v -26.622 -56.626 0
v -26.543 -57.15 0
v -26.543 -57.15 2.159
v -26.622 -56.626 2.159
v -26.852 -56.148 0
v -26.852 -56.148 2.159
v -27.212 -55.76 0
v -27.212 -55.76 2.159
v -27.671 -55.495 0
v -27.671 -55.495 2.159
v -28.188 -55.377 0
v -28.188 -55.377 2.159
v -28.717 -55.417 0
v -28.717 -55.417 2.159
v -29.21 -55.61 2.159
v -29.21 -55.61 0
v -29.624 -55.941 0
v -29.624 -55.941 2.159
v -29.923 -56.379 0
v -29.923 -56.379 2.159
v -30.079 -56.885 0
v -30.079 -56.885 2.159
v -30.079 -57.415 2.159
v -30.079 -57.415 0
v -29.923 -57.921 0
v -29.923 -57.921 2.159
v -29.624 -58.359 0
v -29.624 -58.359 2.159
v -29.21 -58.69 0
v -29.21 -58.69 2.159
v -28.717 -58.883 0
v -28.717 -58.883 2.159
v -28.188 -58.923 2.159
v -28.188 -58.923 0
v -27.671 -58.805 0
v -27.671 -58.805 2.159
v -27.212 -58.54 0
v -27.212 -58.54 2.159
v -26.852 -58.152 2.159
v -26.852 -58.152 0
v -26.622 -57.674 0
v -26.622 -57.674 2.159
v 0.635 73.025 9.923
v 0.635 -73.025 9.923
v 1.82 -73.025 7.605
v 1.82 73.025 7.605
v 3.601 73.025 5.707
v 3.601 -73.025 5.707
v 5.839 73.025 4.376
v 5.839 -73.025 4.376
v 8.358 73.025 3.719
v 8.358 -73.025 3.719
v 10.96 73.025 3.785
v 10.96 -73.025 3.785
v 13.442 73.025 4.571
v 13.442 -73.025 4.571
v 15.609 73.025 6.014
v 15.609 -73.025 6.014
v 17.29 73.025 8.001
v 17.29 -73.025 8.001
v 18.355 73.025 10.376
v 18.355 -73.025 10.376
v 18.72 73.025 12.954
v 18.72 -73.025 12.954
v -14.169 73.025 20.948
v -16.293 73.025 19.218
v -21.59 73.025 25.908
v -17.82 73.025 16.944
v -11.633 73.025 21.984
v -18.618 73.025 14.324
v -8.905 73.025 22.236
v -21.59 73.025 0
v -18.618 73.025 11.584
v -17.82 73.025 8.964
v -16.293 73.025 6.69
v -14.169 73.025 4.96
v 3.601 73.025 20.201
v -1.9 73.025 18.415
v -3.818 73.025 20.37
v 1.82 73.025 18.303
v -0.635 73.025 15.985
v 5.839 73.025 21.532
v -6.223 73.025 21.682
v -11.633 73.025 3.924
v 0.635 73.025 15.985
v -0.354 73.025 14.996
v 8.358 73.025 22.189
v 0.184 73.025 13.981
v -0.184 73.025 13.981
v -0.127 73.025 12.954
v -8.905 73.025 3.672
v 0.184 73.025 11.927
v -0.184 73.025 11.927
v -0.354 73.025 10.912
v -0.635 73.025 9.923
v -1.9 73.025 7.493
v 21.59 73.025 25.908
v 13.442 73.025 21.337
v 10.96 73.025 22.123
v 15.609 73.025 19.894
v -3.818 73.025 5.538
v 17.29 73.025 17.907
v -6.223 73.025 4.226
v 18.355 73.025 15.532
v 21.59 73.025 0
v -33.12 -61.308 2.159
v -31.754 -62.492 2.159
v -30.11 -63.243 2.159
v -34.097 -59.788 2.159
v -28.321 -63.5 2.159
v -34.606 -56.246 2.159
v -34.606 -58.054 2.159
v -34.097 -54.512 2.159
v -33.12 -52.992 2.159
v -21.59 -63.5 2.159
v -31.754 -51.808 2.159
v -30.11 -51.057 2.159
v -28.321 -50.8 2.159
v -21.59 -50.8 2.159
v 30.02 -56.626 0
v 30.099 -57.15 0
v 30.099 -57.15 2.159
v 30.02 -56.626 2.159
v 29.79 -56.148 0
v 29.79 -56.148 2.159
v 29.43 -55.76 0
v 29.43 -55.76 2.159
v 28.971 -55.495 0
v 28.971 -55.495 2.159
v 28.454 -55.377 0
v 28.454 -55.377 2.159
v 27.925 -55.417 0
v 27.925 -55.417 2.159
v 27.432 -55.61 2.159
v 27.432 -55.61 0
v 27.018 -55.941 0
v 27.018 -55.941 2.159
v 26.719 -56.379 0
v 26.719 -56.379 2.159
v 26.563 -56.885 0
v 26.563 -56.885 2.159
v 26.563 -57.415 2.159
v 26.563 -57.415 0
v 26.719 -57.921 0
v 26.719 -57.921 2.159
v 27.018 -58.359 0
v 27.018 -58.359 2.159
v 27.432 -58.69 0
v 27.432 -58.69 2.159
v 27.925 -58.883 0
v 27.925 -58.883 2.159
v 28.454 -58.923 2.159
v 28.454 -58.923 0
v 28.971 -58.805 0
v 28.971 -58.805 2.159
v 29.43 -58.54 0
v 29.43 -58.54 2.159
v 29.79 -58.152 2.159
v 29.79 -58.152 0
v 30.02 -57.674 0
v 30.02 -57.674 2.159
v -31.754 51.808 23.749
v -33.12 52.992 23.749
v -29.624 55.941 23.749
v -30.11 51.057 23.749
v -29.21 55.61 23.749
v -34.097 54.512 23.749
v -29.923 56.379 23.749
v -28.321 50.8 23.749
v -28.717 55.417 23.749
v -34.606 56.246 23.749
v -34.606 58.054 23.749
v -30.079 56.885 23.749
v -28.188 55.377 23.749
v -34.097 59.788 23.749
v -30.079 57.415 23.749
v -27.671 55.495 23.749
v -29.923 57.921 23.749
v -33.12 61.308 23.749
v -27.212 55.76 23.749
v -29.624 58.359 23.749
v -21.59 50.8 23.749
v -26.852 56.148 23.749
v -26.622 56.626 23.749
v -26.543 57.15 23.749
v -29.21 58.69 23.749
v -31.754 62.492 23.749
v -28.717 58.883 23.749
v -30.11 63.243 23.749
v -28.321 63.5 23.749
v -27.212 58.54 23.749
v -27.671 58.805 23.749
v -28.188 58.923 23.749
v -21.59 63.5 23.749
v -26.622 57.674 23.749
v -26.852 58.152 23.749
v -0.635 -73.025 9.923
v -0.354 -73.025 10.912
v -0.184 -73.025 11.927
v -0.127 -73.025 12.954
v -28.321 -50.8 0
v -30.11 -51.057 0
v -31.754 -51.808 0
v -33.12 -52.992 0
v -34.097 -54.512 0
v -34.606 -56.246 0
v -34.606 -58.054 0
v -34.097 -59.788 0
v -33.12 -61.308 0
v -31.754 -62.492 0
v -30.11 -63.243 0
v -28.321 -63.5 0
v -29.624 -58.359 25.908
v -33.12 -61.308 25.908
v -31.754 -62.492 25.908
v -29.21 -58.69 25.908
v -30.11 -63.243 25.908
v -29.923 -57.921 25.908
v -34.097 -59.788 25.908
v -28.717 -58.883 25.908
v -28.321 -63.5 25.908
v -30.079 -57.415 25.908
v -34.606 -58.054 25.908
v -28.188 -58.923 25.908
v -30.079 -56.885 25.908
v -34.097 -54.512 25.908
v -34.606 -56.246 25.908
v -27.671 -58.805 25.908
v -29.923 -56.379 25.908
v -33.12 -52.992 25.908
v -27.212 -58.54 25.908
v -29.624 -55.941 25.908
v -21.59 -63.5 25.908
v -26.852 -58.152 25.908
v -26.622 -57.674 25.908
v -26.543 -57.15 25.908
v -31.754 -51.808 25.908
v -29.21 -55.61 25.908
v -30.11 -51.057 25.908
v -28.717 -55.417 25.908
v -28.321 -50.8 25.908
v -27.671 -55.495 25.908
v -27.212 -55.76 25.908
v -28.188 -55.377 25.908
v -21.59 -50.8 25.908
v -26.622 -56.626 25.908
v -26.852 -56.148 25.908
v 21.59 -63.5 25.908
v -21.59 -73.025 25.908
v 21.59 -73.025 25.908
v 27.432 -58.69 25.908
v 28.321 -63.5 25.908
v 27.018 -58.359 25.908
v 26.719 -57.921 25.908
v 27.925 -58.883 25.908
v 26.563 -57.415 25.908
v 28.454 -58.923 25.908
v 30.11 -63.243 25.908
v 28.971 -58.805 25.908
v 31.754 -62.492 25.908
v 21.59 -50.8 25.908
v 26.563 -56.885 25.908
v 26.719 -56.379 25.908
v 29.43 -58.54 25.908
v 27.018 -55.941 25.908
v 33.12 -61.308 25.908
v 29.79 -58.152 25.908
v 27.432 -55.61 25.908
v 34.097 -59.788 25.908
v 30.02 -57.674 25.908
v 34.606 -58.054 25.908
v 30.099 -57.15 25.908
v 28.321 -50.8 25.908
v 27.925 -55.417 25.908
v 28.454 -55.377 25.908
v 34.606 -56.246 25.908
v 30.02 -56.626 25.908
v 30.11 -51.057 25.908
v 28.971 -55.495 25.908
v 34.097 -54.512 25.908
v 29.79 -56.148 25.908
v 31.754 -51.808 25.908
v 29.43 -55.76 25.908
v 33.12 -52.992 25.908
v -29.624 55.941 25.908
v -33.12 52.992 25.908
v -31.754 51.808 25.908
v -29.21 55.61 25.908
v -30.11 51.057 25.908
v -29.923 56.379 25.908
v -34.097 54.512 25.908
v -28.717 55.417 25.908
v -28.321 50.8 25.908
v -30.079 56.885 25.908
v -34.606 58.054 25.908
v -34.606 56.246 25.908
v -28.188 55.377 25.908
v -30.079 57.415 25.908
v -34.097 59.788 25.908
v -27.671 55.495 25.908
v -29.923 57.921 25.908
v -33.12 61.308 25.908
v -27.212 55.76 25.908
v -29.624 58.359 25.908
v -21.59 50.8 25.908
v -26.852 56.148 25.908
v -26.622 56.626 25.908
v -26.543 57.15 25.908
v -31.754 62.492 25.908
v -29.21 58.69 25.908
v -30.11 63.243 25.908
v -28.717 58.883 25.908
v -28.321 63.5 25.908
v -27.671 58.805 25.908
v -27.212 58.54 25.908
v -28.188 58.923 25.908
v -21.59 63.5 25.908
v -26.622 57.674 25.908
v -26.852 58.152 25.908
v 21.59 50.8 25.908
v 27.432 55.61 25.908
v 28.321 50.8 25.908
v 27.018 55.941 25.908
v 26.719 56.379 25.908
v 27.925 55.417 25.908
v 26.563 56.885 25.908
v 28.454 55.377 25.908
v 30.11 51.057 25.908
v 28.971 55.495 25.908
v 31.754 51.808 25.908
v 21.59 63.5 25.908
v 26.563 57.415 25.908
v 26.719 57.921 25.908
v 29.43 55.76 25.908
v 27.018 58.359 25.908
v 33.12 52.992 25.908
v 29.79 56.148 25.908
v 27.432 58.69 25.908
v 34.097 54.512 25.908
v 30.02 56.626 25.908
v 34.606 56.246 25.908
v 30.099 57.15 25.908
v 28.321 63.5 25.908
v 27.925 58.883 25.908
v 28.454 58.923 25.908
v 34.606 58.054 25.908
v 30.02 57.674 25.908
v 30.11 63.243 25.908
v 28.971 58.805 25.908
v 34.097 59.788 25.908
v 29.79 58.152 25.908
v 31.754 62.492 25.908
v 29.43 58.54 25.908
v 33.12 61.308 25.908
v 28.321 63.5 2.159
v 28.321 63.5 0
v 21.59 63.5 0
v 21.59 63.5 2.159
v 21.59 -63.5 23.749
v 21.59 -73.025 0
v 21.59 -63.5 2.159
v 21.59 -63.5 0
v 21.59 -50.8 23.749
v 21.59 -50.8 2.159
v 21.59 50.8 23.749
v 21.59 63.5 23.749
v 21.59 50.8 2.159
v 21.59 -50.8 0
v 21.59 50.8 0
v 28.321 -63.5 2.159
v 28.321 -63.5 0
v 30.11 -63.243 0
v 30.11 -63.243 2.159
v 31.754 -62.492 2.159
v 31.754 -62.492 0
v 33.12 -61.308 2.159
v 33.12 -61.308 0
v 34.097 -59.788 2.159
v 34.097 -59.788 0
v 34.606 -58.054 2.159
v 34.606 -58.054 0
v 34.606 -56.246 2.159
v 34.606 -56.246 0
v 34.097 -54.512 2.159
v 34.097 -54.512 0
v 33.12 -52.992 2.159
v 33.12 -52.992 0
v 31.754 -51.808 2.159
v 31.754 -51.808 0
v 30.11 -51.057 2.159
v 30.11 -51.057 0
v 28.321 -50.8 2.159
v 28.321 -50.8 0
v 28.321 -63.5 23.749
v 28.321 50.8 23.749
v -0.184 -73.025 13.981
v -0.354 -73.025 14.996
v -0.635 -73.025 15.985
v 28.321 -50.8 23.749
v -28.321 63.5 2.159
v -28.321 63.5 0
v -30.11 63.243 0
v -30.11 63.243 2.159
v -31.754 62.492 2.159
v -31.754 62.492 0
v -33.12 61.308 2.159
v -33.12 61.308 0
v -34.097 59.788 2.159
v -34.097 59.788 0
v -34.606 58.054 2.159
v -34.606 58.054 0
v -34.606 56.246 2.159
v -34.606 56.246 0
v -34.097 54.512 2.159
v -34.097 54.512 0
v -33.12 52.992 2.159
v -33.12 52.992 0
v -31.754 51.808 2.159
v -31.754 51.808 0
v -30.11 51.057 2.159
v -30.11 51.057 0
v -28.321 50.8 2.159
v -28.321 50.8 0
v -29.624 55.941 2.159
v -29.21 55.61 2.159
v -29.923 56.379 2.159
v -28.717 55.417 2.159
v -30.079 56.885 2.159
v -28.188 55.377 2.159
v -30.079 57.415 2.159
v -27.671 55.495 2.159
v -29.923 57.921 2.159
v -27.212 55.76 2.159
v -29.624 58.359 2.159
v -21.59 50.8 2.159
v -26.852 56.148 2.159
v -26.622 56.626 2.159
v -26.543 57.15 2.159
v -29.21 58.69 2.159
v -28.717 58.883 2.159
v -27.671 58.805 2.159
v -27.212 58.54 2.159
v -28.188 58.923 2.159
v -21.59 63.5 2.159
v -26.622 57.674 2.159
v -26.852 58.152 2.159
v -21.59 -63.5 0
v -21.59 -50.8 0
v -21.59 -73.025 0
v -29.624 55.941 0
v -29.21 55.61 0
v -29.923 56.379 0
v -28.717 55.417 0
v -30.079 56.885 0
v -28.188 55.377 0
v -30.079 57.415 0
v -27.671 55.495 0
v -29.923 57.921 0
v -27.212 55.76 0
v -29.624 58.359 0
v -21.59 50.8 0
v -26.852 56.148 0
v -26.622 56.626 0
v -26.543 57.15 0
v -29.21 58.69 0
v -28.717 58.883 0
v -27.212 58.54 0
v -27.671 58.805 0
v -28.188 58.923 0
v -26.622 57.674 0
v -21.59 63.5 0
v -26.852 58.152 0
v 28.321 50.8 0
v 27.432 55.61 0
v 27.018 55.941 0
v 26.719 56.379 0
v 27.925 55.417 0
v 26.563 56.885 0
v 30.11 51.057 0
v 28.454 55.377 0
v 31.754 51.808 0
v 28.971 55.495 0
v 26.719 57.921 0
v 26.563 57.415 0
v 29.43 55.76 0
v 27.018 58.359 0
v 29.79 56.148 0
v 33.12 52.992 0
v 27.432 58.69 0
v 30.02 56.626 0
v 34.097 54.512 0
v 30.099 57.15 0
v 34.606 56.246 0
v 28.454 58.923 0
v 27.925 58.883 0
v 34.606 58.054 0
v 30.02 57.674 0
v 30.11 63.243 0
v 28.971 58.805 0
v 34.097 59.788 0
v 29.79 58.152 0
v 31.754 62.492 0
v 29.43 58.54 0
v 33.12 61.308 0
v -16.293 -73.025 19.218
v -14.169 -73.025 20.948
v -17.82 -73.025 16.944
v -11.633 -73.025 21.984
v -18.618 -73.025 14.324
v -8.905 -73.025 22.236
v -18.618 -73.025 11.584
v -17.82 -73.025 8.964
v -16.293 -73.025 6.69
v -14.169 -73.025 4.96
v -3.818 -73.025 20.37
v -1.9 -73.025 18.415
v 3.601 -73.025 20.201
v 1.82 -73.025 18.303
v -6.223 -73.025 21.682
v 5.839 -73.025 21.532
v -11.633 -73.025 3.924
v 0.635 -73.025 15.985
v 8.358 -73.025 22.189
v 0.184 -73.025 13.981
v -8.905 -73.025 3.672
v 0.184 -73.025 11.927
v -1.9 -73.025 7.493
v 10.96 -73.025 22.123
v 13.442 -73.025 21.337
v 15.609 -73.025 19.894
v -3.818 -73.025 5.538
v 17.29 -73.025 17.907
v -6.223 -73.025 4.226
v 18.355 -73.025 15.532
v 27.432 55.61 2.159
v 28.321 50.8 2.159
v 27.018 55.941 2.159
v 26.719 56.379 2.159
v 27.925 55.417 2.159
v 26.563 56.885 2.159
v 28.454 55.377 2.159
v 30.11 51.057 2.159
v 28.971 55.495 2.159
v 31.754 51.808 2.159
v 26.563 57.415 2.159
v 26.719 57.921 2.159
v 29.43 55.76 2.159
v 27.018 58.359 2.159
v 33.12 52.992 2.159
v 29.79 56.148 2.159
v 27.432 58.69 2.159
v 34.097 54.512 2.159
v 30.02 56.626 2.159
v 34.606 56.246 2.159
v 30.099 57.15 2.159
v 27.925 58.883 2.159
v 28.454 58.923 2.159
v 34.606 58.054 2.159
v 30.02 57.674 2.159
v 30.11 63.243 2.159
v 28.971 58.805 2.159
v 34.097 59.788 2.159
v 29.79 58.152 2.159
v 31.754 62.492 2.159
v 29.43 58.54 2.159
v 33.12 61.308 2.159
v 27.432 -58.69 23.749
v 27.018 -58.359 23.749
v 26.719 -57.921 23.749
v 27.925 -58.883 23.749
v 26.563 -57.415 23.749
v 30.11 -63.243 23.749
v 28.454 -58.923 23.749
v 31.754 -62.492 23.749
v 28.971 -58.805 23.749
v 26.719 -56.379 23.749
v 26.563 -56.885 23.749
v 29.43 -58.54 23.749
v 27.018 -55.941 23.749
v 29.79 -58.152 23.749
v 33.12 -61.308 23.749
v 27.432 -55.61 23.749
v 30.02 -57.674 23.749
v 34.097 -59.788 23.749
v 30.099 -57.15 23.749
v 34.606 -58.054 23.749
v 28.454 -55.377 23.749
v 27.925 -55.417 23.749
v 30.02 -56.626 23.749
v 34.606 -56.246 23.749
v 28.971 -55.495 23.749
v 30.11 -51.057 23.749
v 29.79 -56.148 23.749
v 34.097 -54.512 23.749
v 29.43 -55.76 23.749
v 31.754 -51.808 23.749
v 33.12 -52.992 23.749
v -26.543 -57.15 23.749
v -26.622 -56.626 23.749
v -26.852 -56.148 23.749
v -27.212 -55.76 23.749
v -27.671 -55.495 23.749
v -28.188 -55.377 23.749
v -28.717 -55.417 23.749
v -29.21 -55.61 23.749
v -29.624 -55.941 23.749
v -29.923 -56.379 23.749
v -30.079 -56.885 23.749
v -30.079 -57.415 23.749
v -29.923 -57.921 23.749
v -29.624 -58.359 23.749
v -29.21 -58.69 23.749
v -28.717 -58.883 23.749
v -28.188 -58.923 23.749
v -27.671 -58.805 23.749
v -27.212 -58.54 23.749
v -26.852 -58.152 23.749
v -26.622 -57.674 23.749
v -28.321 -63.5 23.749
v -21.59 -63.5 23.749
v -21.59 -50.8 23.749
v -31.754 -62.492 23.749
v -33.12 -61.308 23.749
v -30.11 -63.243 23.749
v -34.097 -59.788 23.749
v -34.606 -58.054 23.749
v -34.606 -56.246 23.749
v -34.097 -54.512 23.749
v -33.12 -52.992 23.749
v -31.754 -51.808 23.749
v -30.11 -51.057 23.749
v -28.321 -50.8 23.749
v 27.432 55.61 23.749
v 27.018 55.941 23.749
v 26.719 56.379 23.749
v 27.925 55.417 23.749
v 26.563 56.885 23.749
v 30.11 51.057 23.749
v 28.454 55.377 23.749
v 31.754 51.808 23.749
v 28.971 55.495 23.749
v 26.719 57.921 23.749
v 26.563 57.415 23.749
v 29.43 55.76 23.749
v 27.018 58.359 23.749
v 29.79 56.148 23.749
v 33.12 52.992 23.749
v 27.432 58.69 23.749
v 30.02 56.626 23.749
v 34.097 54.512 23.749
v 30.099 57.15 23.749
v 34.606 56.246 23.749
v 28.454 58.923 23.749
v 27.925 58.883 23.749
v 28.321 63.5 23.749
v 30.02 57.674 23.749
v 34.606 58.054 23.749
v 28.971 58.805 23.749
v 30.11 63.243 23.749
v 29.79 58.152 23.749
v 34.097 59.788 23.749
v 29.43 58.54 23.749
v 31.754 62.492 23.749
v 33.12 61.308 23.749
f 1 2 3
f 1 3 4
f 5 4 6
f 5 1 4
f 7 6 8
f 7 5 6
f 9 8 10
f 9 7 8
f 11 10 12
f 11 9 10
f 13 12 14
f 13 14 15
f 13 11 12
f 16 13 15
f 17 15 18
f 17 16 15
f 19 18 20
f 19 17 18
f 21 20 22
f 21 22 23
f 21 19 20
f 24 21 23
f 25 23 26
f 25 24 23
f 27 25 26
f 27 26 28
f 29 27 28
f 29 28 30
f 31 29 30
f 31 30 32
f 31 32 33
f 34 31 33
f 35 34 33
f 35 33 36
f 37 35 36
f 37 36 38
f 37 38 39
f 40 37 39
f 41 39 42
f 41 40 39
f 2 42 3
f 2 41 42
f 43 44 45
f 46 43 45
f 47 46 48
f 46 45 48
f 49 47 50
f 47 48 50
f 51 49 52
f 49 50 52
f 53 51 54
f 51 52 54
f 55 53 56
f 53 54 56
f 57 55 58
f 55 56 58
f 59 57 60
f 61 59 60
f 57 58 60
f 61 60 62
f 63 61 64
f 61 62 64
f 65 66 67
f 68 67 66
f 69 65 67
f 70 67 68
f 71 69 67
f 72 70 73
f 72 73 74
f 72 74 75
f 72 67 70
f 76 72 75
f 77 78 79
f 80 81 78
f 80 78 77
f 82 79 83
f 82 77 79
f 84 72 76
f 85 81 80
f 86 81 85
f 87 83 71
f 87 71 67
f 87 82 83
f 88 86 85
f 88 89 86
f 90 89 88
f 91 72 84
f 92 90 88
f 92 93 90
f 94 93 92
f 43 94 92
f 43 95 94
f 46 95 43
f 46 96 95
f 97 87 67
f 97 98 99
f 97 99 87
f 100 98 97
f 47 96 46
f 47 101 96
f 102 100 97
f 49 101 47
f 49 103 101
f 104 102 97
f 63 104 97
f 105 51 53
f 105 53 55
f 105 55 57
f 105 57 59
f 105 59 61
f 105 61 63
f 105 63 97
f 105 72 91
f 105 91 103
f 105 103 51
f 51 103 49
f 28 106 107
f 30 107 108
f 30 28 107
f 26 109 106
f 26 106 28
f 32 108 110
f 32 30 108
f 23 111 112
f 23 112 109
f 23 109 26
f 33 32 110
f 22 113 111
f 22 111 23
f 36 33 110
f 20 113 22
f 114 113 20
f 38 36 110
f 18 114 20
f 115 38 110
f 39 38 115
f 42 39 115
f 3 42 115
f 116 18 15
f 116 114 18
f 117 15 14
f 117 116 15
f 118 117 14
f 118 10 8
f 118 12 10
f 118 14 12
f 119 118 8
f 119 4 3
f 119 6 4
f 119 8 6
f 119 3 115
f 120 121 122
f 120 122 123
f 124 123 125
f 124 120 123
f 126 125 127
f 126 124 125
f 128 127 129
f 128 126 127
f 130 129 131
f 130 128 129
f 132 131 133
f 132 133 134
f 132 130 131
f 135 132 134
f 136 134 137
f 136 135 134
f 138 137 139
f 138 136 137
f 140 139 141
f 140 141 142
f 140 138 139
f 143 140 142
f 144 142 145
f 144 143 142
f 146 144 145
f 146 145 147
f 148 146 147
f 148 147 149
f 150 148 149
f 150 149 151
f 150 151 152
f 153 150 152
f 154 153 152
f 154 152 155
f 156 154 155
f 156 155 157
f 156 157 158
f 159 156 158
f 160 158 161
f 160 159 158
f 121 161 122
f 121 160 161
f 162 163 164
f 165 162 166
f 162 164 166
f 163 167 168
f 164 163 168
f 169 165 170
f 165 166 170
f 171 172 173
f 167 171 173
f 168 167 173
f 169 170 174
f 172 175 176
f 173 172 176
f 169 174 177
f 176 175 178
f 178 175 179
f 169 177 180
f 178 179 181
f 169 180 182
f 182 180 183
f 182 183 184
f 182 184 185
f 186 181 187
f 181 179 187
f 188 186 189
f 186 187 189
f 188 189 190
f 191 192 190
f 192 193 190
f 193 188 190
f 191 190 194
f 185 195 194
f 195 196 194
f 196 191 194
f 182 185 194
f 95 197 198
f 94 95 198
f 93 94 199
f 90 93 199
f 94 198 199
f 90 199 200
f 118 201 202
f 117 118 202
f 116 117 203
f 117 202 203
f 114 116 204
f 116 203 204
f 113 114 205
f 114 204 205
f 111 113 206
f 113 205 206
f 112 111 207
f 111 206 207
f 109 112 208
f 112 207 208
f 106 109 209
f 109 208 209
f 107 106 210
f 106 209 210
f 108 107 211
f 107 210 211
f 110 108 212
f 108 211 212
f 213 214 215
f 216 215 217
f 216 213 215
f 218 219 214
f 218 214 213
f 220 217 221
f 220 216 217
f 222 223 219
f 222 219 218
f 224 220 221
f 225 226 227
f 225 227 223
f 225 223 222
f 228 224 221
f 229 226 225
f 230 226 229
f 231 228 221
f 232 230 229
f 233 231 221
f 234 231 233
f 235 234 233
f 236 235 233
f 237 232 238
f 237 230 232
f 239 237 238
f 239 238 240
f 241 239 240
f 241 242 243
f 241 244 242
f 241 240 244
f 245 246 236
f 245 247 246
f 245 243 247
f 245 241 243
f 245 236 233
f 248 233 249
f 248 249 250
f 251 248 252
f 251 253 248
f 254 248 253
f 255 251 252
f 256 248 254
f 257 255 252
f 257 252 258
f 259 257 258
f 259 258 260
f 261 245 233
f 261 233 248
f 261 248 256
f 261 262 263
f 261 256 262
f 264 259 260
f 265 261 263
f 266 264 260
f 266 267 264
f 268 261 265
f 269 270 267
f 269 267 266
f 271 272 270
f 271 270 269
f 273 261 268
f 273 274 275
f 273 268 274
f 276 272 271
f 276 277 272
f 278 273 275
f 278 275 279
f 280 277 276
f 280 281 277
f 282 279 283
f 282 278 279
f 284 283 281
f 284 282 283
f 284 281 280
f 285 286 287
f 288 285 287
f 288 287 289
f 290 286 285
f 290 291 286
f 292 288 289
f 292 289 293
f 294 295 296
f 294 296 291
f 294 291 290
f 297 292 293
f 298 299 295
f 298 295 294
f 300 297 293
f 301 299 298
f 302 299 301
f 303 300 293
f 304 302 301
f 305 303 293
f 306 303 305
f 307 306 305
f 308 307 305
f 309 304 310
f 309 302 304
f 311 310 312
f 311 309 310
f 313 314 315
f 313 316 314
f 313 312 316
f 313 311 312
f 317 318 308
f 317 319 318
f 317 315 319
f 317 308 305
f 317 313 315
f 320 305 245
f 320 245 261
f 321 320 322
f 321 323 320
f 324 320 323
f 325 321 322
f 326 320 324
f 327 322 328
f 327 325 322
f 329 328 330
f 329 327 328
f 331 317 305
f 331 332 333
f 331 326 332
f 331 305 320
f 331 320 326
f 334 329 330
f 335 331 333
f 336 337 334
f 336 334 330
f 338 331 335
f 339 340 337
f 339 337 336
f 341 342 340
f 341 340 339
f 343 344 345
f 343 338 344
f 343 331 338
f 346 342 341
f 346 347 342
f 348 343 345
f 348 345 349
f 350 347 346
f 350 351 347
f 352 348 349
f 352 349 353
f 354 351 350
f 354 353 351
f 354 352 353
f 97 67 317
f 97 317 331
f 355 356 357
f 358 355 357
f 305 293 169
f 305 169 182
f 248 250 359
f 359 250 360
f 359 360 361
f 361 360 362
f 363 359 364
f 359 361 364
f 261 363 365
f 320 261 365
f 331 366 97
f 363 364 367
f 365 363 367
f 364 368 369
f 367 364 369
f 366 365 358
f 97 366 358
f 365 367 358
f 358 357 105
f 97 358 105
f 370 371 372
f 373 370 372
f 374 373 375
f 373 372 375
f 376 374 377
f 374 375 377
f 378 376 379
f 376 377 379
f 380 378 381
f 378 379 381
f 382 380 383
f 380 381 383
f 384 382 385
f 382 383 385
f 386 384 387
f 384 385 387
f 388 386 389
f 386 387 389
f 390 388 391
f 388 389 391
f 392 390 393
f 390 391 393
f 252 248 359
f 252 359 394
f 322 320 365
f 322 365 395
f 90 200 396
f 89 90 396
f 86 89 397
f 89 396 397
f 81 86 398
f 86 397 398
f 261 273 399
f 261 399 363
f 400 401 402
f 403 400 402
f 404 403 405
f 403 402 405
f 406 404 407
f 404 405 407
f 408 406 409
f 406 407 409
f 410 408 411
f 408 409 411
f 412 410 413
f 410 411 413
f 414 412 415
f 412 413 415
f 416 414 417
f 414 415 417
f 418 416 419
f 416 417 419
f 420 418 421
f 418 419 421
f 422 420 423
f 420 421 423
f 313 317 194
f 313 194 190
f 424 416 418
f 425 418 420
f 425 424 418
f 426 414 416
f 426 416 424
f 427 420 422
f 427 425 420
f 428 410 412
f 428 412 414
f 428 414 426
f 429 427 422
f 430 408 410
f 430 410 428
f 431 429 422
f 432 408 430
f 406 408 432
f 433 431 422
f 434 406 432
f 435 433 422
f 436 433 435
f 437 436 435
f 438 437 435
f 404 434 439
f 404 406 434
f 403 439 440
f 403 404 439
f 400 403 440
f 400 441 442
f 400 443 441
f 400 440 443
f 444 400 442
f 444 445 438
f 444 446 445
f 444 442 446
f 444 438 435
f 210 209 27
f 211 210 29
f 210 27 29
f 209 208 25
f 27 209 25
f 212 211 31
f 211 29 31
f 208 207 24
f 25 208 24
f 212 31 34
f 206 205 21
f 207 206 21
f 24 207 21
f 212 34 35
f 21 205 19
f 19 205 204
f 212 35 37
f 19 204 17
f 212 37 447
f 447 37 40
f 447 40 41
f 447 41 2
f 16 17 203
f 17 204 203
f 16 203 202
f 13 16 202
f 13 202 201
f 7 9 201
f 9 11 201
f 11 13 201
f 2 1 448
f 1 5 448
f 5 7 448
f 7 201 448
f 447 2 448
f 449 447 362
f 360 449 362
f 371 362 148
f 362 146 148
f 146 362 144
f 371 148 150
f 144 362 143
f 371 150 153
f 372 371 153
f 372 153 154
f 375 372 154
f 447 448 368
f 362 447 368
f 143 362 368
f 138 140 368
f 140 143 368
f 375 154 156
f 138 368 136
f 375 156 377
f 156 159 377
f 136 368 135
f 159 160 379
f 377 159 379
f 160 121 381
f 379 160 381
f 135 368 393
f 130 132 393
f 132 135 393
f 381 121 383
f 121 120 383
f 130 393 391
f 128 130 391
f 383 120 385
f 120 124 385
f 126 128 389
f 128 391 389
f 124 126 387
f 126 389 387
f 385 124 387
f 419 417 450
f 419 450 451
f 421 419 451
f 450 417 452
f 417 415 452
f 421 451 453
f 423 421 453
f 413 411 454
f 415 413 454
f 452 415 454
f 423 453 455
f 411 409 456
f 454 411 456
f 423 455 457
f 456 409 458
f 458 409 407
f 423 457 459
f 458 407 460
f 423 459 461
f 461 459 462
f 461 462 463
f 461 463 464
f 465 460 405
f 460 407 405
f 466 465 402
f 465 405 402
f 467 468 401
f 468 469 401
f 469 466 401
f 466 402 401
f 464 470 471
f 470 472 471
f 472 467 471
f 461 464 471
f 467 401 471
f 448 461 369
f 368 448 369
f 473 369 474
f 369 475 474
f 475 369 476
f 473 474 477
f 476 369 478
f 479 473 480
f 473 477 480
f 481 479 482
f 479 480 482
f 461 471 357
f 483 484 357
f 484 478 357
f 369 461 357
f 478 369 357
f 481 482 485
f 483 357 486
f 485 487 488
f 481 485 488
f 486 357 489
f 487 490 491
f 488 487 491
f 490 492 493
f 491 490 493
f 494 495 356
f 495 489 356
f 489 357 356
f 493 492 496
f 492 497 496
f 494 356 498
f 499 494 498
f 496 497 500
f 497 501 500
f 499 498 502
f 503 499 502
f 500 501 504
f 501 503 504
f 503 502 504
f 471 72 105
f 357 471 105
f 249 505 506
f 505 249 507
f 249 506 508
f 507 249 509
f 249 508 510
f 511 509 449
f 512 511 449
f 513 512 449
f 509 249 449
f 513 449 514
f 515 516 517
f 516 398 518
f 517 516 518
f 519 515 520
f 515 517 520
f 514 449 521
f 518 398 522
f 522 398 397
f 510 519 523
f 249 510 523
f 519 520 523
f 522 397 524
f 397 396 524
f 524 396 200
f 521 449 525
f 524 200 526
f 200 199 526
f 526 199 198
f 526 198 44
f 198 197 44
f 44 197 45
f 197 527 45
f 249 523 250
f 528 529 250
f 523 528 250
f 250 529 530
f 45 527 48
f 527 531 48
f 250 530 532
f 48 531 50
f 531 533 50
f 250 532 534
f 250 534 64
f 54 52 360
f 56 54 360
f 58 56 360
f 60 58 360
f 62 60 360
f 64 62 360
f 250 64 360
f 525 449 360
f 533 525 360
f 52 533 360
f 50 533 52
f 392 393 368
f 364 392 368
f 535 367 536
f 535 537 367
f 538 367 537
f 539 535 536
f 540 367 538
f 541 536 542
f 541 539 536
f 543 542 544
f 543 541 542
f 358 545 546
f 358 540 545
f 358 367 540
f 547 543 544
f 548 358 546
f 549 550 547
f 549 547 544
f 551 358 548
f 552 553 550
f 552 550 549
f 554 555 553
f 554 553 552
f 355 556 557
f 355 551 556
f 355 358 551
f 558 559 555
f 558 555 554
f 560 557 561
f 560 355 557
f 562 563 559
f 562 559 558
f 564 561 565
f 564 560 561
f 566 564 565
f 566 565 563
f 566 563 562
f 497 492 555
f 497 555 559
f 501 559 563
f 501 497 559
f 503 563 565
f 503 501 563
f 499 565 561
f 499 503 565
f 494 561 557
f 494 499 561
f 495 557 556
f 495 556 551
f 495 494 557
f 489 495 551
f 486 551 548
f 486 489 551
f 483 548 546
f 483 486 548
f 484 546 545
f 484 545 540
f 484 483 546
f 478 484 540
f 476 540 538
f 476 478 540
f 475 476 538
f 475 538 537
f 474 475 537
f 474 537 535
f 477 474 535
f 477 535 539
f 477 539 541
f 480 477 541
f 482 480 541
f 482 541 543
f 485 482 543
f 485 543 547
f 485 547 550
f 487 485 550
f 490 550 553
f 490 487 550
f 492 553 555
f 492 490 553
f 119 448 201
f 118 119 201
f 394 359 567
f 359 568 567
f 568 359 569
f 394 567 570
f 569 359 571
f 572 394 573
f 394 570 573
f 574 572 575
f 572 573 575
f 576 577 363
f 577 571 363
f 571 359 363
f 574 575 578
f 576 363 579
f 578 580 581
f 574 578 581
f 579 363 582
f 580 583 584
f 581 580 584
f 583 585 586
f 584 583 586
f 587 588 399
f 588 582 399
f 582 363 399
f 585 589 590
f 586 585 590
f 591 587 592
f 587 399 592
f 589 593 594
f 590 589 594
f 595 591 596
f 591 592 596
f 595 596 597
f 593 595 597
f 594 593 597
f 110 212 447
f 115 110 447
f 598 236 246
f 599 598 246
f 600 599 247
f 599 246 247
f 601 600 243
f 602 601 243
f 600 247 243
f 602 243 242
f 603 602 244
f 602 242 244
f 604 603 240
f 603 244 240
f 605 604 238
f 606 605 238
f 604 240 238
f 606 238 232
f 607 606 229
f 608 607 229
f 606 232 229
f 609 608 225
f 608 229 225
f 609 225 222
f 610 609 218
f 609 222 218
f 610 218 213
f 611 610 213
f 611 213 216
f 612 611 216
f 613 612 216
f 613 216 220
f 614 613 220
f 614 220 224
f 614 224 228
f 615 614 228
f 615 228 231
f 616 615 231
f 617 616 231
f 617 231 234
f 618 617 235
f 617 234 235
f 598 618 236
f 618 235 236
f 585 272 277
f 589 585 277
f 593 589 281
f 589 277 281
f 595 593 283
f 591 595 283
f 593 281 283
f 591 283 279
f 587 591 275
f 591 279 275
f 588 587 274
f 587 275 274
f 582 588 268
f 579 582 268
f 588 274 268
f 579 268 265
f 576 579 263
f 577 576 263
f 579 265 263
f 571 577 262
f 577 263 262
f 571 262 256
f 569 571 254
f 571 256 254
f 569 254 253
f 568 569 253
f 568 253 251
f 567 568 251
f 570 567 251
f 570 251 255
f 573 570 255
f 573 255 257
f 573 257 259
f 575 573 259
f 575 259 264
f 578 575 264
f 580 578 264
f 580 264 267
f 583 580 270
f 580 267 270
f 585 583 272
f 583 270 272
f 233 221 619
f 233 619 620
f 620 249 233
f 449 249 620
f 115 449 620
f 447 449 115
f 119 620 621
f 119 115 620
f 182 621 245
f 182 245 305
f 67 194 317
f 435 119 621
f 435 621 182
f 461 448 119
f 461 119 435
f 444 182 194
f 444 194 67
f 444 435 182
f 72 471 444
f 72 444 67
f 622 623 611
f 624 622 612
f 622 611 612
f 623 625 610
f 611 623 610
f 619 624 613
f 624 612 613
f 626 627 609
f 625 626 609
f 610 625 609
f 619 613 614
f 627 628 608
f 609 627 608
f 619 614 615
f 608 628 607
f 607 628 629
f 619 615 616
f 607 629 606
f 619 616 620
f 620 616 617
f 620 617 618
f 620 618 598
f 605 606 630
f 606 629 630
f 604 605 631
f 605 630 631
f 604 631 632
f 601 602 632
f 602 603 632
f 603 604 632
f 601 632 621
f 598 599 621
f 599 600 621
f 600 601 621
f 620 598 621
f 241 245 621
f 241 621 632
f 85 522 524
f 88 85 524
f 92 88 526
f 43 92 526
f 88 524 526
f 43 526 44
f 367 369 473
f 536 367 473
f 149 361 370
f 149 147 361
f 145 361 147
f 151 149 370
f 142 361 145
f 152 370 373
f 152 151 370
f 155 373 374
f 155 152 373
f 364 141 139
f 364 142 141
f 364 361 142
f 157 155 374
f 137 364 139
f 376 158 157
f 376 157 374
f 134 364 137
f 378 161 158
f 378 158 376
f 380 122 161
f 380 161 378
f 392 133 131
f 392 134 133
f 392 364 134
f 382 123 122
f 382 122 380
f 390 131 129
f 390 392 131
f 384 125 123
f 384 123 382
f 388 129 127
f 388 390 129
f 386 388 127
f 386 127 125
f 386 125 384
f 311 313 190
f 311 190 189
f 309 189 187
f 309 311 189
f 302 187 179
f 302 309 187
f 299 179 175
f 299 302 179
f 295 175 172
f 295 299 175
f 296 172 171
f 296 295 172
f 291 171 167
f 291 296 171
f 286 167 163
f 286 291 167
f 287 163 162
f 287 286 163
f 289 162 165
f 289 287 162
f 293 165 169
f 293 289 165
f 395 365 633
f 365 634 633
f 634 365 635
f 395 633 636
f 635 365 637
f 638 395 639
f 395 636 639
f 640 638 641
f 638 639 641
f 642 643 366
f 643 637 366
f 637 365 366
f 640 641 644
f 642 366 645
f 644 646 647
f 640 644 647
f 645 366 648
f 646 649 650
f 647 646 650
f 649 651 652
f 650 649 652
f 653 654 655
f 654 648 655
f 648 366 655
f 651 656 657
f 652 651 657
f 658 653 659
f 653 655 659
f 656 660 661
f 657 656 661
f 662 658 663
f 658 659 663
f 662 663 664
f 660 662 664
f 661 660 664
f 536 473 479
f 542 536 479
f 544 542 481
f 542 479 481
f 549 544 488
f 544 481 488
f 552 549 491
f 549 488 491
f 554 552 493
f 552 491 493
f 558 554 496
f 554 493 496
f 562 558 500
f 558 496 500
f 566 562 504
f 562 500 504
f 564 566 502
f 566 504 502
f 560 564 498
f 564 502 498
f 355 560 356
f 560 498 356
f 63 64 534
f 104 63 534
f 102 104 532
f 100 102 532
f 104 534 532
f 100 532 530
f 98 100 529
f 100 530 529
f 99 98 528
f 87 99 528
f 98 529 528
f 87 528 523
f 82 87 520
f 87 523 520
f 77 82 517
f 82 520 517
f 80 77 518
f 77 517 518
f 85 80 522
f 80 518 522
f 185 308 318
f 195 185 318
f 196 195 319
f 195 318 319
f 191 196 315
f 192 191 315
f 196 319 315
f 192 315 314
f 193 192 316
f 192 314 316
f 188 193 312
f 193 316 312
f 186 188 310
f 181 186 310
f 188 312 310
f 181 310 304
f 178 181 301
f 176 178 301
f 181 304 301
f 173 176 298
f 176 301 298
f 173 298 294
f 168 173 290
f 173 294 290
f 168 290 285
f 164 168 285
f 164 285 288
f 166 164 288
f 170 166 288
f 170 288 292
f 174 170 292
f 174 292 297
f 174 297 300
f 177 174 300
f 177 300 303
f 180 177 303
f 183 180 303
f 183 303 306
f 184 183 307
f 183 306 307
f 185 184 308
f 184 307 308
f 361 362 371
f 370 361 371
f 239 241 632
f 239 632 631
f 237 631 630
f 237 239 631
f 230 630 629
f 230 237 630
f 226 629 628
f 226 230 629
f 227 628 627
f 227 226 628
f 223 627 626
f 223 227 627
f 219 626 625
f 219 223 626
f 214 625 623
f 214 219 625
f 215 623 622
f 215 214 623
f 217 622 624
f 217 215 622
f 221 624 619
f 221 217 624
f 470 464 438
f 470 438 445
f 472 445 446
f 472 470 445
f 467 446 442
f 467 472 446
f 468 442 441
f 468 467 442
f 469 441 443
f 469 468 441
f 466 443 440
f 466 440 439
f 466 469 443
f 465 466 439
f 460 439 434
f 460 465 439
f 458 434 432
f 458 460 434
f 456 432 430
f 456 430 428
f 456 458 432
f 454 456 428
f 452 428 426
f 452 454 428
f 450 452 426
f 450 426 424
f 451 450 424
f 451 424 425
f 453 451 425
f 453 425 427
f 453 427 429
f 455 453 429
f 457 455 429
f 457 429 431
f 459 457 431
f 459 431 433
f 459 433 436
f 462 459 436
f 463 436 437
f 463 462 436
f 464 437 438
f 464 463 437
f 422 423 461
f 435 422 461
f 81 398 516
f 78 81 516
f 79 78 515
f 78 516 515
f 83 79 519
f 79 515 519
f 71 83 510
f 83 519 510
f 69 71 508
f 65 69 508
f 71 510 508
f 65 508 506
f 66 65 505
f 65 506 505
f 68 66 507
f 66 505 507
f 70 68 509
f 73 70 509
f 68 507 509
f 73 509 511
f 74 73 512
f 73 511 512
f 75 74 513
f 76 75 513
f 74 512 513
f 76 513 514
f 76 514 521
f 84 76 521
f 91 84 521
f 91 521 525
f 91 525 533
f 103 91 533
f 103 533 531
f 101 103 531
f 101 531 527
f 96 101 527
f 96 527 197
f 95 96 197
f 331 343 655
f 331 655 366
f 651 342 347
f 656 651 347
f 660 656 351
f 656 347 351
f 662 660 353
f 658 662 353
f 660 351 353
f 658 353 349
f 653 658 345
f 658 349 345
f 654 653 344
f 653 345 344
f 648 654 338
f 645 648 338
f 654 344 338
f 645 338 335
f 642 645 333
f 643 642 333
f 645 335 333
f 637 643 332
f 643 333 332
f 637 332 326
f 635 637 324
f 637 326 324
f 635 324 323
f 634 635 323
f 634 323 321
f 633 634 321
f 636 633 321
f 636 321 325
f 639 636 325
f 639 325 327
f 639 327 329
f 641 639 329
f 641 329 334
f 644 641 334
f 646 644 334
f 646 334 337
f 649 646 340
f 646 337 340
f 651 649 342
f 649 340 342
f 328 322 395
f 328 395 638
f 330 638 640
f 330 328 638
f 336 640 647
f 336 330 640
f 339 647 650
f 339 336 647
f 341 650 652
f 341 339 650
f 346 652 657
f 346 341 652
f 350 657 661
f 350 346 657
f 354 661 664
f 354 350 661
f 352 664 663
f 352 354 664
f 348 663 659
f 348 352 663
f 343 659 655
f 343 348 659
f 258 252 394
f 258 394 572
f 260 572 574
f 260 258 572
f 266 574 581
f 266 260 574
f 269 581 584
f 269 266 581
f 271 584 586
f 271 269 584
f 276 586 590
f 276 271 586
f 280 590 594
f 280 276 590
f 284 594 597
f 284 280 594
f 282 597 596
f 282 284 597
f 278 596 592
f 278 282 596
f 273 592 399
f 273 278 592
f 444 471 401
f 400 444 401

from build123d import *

# Parameters (mm, degrees)
F0_R     = 1.778
F1_DEPTH = 2.159
F2_W     = 43.18
F2_H     = 146.05
F3_DEPTH = 21.59
F4_R     = 1.778
F5_DEPTH = 2.159
F7_DEPTH = 146.051


# Not quite as in the source:
# - a pattern or mirror of a feature is missing from the dataset's text; its kind, count and spacing are read off the source's solid


with BuildPart() as f1:
    # F0 (on Top) → F1 (new body)
    with BuildSketch(Plane.XY):
        Polygon((21.59, 63.5), (21.59, 73.025), (-21.59, 73.025), (-21.59, 63.5), (-21.59, 50.8), (-21.59, -50.8), (-21.59, -63.5), (-21.59, -73.025), (21.59, -73.025), (21.59, -63.5), (21.59, -50.8), (21.59, 50.8), align=None)
        with BuildLine():
            Line((28.321, 63.5), (21.59, 63.5))
            Line((21.59, 63.5), (21.59, 50.8))
            Line((21.59, 50.8), (28.321, 50.8))
            ThreePointArc((28.321, 50.8), (34.671, 57.15), (28.321, 63.5))
        make_face()
        with Locations((28.321, 57.15)):
            Circle(F0_R, mode=Mode.SUBTRACT)
        with BuildLine():
            Line((-21.59, 50.8), (-21.59, 63.5))
            Line((-21.59, 63.5), (-28.321, 63.5))
            ThreePointArc((-28.321, 63.5), (-34.671, 57.15), (-28.321, 50.8))
            Line((-28.321, 50.8), (-21.59, 50.8))
        make_face()
        with Locations((-28.321, 57.15)):
            Circle(F0_R, mode=Mode.SUBTRACT)
        with BuildLine():
            Line((28.321, -50.8), (21.59, -50.8))
            Line((21.59, -50.8), (21.59, -63.5))
            Line((21.59, -63.5), (28.321, -63.5))
            ThreePointArc((28.321, -63.5), (34.671, -57.15), (28.321, -50.8))
        make_face()
        with Locations((28.321, -57.15)):
            Circle(F0_R, mode=Mode.SUBTRACT)
        with BuildLine():
            Line((-21.59, -63.5), (-21.59, -50.8))
            Line((-21.59, -50.8), (-28.321, -50.8))
            ThreePointArc((-28.321, -50.8), (-34.671, -57.15), (-28.321, -63.5))
            Line((-28.321, -63.5), (-21.59, -63.5))
        make_face()
        with Locations((-28.321, -57.15)):
            Circle(F0_R, mode=Mode.SUBTRACT)
    extrude(amount=F1_DEPTH)


with BuildPart() as f1_copies_1:
    # F1_copies: instance of F1
    add(f1.part.mirror(Plane.XY.offset(12.954)))


with BuildPart() as f1_1:
    add(f1.part)

    add(f1_copies_1.part)  # F3 merges F1_copies_1
    # F2 (on face) → F3 (join)
    with BuildSketch(Plane.XY.offset(2.159)):
        Rectangle(F2_W, F2_H)
    extrude(amount=F3_DEPTH)

    # F4 (on face) → F5 (join)
    with BuildSketch(Plane.XY):
        Polygon((21.59, 63.5), (21.59, 73.025), (-21.59, 73.025), (-21.59, 63.5), (-21.59, 50.8), (-21.59, -50.8), (-21.59, -63.5), (-21.59, -73.025), (21.59, -73.025), (21.59, -63.5), (21.59, -50.8), (21.59, 50.8), align=None)
        with BuildLine():
            Line((28.321, 63.5), (21.59, 63.5))
            Line((21.59, 63.5), (21.59, 50.8))
            Line((21.59, 50.8), (28.321, 50.8))
            ThreePointArc((28.321, 50.8), (34.671, 57.15), (28.321, 63.5))
        make_face()
        with Locations((28.321, 57.15)):
            Circle(F4_R, mode=Mode.SUBTRACT)
        with BuildLine():
            Line((-21.59, 50.8), (-21.59, 63.5))
            Line((-21.59, 63.5), (-28.321, 63.5))
            ThreePointArc((-28.321, 63.5), (-34.671, 57.15), (-28.321, 50.8))
            Line((-28.321, 50.8), (-21.59, 50.8))
        make_face()
        with Locations((-28.321, 57.15)):
            Circle(F4_R, mode=Mode.SUBTRACT)
        with BuildLine():
            Line((28.321, -50.8), (21.59, -50.8))
            Line((21.59, -50.8), (21.59, -63.5))
            Line((21.59, -63.5), (28.321, -63.5))
            ThreePointArc((28.321, -63.5), (34.671, -57.15), (28.321, -50.8))
        make_face()
        with Locations((28.321, -57.15)):
            Circle(F4_R, mode=Mode.SUBTRACT)
        with BuildLine():
            Line((-21.59, -63.5), (-21.59, -50.8))
            Line((-21.59, -50.8), (-28.321, -50.8))
            ThreePointArc((-28.321, -50.8), (-34.671, -57.15), (-28.321, -63.5))
            Line((-28.321, -63.5), (-21.59, -63.5))
        make_face()
        with Locations((-28.321, -57.15)):
            Circle(F4_R, mode=Mode.SUBTRACT)
    extrude(amount=F5_DEPTH)

    # F6 (on face) → F7 (cut, through all)
    with BuildSketch(Plane.XZ.offset(73.025)):
        with BuildLine():
            Line((-0.635, 9.9229806335), (-0.635, 15.9850193665))
            ThreePointArc((-0.635, 15.9850193665), (-18.7198, 12.954), (-0.635, 9.9229806335))
        make_face()
        with BuildLine():
            ThreePointArc((-0.635, 9.9229806335), (-0.2548795436, 11.4173524802), (-0.127, 12.954))
            ThreePointArc((-0.127, 12.954), (-0.2548795436, 14.4906475198), (-0.635, 15.9850193665))
            Line((-0.635, 15.9850193665), (-0.635, 9.9229806335))
        make_face()
        with BuildLine():
            Line((0.635, 9.9229806335), (0.635, 15.9850193665))
            ThreePointArc((0.635, 15.9850193665), (0.127, 12.954), (0.635, 9.9229806335))
        make_face()
        with BuildLine():
            ThreePointArc((18.7198, 12.954), (10.9600475198, 22.1225204564), (0.635, 15.9850193665))
            Line((0.635, 15.9850193665), (0.635, 9.9229806335))
            ThreePointArc((0.635, 9.9229806335), (10.9600475198, 3.7854795436), (18.7198, 12.954))
        make_face()
    extrude(amount=-F7_DEPTH, mode=Mode.SUBTRACT)


solid = f1_1.part
